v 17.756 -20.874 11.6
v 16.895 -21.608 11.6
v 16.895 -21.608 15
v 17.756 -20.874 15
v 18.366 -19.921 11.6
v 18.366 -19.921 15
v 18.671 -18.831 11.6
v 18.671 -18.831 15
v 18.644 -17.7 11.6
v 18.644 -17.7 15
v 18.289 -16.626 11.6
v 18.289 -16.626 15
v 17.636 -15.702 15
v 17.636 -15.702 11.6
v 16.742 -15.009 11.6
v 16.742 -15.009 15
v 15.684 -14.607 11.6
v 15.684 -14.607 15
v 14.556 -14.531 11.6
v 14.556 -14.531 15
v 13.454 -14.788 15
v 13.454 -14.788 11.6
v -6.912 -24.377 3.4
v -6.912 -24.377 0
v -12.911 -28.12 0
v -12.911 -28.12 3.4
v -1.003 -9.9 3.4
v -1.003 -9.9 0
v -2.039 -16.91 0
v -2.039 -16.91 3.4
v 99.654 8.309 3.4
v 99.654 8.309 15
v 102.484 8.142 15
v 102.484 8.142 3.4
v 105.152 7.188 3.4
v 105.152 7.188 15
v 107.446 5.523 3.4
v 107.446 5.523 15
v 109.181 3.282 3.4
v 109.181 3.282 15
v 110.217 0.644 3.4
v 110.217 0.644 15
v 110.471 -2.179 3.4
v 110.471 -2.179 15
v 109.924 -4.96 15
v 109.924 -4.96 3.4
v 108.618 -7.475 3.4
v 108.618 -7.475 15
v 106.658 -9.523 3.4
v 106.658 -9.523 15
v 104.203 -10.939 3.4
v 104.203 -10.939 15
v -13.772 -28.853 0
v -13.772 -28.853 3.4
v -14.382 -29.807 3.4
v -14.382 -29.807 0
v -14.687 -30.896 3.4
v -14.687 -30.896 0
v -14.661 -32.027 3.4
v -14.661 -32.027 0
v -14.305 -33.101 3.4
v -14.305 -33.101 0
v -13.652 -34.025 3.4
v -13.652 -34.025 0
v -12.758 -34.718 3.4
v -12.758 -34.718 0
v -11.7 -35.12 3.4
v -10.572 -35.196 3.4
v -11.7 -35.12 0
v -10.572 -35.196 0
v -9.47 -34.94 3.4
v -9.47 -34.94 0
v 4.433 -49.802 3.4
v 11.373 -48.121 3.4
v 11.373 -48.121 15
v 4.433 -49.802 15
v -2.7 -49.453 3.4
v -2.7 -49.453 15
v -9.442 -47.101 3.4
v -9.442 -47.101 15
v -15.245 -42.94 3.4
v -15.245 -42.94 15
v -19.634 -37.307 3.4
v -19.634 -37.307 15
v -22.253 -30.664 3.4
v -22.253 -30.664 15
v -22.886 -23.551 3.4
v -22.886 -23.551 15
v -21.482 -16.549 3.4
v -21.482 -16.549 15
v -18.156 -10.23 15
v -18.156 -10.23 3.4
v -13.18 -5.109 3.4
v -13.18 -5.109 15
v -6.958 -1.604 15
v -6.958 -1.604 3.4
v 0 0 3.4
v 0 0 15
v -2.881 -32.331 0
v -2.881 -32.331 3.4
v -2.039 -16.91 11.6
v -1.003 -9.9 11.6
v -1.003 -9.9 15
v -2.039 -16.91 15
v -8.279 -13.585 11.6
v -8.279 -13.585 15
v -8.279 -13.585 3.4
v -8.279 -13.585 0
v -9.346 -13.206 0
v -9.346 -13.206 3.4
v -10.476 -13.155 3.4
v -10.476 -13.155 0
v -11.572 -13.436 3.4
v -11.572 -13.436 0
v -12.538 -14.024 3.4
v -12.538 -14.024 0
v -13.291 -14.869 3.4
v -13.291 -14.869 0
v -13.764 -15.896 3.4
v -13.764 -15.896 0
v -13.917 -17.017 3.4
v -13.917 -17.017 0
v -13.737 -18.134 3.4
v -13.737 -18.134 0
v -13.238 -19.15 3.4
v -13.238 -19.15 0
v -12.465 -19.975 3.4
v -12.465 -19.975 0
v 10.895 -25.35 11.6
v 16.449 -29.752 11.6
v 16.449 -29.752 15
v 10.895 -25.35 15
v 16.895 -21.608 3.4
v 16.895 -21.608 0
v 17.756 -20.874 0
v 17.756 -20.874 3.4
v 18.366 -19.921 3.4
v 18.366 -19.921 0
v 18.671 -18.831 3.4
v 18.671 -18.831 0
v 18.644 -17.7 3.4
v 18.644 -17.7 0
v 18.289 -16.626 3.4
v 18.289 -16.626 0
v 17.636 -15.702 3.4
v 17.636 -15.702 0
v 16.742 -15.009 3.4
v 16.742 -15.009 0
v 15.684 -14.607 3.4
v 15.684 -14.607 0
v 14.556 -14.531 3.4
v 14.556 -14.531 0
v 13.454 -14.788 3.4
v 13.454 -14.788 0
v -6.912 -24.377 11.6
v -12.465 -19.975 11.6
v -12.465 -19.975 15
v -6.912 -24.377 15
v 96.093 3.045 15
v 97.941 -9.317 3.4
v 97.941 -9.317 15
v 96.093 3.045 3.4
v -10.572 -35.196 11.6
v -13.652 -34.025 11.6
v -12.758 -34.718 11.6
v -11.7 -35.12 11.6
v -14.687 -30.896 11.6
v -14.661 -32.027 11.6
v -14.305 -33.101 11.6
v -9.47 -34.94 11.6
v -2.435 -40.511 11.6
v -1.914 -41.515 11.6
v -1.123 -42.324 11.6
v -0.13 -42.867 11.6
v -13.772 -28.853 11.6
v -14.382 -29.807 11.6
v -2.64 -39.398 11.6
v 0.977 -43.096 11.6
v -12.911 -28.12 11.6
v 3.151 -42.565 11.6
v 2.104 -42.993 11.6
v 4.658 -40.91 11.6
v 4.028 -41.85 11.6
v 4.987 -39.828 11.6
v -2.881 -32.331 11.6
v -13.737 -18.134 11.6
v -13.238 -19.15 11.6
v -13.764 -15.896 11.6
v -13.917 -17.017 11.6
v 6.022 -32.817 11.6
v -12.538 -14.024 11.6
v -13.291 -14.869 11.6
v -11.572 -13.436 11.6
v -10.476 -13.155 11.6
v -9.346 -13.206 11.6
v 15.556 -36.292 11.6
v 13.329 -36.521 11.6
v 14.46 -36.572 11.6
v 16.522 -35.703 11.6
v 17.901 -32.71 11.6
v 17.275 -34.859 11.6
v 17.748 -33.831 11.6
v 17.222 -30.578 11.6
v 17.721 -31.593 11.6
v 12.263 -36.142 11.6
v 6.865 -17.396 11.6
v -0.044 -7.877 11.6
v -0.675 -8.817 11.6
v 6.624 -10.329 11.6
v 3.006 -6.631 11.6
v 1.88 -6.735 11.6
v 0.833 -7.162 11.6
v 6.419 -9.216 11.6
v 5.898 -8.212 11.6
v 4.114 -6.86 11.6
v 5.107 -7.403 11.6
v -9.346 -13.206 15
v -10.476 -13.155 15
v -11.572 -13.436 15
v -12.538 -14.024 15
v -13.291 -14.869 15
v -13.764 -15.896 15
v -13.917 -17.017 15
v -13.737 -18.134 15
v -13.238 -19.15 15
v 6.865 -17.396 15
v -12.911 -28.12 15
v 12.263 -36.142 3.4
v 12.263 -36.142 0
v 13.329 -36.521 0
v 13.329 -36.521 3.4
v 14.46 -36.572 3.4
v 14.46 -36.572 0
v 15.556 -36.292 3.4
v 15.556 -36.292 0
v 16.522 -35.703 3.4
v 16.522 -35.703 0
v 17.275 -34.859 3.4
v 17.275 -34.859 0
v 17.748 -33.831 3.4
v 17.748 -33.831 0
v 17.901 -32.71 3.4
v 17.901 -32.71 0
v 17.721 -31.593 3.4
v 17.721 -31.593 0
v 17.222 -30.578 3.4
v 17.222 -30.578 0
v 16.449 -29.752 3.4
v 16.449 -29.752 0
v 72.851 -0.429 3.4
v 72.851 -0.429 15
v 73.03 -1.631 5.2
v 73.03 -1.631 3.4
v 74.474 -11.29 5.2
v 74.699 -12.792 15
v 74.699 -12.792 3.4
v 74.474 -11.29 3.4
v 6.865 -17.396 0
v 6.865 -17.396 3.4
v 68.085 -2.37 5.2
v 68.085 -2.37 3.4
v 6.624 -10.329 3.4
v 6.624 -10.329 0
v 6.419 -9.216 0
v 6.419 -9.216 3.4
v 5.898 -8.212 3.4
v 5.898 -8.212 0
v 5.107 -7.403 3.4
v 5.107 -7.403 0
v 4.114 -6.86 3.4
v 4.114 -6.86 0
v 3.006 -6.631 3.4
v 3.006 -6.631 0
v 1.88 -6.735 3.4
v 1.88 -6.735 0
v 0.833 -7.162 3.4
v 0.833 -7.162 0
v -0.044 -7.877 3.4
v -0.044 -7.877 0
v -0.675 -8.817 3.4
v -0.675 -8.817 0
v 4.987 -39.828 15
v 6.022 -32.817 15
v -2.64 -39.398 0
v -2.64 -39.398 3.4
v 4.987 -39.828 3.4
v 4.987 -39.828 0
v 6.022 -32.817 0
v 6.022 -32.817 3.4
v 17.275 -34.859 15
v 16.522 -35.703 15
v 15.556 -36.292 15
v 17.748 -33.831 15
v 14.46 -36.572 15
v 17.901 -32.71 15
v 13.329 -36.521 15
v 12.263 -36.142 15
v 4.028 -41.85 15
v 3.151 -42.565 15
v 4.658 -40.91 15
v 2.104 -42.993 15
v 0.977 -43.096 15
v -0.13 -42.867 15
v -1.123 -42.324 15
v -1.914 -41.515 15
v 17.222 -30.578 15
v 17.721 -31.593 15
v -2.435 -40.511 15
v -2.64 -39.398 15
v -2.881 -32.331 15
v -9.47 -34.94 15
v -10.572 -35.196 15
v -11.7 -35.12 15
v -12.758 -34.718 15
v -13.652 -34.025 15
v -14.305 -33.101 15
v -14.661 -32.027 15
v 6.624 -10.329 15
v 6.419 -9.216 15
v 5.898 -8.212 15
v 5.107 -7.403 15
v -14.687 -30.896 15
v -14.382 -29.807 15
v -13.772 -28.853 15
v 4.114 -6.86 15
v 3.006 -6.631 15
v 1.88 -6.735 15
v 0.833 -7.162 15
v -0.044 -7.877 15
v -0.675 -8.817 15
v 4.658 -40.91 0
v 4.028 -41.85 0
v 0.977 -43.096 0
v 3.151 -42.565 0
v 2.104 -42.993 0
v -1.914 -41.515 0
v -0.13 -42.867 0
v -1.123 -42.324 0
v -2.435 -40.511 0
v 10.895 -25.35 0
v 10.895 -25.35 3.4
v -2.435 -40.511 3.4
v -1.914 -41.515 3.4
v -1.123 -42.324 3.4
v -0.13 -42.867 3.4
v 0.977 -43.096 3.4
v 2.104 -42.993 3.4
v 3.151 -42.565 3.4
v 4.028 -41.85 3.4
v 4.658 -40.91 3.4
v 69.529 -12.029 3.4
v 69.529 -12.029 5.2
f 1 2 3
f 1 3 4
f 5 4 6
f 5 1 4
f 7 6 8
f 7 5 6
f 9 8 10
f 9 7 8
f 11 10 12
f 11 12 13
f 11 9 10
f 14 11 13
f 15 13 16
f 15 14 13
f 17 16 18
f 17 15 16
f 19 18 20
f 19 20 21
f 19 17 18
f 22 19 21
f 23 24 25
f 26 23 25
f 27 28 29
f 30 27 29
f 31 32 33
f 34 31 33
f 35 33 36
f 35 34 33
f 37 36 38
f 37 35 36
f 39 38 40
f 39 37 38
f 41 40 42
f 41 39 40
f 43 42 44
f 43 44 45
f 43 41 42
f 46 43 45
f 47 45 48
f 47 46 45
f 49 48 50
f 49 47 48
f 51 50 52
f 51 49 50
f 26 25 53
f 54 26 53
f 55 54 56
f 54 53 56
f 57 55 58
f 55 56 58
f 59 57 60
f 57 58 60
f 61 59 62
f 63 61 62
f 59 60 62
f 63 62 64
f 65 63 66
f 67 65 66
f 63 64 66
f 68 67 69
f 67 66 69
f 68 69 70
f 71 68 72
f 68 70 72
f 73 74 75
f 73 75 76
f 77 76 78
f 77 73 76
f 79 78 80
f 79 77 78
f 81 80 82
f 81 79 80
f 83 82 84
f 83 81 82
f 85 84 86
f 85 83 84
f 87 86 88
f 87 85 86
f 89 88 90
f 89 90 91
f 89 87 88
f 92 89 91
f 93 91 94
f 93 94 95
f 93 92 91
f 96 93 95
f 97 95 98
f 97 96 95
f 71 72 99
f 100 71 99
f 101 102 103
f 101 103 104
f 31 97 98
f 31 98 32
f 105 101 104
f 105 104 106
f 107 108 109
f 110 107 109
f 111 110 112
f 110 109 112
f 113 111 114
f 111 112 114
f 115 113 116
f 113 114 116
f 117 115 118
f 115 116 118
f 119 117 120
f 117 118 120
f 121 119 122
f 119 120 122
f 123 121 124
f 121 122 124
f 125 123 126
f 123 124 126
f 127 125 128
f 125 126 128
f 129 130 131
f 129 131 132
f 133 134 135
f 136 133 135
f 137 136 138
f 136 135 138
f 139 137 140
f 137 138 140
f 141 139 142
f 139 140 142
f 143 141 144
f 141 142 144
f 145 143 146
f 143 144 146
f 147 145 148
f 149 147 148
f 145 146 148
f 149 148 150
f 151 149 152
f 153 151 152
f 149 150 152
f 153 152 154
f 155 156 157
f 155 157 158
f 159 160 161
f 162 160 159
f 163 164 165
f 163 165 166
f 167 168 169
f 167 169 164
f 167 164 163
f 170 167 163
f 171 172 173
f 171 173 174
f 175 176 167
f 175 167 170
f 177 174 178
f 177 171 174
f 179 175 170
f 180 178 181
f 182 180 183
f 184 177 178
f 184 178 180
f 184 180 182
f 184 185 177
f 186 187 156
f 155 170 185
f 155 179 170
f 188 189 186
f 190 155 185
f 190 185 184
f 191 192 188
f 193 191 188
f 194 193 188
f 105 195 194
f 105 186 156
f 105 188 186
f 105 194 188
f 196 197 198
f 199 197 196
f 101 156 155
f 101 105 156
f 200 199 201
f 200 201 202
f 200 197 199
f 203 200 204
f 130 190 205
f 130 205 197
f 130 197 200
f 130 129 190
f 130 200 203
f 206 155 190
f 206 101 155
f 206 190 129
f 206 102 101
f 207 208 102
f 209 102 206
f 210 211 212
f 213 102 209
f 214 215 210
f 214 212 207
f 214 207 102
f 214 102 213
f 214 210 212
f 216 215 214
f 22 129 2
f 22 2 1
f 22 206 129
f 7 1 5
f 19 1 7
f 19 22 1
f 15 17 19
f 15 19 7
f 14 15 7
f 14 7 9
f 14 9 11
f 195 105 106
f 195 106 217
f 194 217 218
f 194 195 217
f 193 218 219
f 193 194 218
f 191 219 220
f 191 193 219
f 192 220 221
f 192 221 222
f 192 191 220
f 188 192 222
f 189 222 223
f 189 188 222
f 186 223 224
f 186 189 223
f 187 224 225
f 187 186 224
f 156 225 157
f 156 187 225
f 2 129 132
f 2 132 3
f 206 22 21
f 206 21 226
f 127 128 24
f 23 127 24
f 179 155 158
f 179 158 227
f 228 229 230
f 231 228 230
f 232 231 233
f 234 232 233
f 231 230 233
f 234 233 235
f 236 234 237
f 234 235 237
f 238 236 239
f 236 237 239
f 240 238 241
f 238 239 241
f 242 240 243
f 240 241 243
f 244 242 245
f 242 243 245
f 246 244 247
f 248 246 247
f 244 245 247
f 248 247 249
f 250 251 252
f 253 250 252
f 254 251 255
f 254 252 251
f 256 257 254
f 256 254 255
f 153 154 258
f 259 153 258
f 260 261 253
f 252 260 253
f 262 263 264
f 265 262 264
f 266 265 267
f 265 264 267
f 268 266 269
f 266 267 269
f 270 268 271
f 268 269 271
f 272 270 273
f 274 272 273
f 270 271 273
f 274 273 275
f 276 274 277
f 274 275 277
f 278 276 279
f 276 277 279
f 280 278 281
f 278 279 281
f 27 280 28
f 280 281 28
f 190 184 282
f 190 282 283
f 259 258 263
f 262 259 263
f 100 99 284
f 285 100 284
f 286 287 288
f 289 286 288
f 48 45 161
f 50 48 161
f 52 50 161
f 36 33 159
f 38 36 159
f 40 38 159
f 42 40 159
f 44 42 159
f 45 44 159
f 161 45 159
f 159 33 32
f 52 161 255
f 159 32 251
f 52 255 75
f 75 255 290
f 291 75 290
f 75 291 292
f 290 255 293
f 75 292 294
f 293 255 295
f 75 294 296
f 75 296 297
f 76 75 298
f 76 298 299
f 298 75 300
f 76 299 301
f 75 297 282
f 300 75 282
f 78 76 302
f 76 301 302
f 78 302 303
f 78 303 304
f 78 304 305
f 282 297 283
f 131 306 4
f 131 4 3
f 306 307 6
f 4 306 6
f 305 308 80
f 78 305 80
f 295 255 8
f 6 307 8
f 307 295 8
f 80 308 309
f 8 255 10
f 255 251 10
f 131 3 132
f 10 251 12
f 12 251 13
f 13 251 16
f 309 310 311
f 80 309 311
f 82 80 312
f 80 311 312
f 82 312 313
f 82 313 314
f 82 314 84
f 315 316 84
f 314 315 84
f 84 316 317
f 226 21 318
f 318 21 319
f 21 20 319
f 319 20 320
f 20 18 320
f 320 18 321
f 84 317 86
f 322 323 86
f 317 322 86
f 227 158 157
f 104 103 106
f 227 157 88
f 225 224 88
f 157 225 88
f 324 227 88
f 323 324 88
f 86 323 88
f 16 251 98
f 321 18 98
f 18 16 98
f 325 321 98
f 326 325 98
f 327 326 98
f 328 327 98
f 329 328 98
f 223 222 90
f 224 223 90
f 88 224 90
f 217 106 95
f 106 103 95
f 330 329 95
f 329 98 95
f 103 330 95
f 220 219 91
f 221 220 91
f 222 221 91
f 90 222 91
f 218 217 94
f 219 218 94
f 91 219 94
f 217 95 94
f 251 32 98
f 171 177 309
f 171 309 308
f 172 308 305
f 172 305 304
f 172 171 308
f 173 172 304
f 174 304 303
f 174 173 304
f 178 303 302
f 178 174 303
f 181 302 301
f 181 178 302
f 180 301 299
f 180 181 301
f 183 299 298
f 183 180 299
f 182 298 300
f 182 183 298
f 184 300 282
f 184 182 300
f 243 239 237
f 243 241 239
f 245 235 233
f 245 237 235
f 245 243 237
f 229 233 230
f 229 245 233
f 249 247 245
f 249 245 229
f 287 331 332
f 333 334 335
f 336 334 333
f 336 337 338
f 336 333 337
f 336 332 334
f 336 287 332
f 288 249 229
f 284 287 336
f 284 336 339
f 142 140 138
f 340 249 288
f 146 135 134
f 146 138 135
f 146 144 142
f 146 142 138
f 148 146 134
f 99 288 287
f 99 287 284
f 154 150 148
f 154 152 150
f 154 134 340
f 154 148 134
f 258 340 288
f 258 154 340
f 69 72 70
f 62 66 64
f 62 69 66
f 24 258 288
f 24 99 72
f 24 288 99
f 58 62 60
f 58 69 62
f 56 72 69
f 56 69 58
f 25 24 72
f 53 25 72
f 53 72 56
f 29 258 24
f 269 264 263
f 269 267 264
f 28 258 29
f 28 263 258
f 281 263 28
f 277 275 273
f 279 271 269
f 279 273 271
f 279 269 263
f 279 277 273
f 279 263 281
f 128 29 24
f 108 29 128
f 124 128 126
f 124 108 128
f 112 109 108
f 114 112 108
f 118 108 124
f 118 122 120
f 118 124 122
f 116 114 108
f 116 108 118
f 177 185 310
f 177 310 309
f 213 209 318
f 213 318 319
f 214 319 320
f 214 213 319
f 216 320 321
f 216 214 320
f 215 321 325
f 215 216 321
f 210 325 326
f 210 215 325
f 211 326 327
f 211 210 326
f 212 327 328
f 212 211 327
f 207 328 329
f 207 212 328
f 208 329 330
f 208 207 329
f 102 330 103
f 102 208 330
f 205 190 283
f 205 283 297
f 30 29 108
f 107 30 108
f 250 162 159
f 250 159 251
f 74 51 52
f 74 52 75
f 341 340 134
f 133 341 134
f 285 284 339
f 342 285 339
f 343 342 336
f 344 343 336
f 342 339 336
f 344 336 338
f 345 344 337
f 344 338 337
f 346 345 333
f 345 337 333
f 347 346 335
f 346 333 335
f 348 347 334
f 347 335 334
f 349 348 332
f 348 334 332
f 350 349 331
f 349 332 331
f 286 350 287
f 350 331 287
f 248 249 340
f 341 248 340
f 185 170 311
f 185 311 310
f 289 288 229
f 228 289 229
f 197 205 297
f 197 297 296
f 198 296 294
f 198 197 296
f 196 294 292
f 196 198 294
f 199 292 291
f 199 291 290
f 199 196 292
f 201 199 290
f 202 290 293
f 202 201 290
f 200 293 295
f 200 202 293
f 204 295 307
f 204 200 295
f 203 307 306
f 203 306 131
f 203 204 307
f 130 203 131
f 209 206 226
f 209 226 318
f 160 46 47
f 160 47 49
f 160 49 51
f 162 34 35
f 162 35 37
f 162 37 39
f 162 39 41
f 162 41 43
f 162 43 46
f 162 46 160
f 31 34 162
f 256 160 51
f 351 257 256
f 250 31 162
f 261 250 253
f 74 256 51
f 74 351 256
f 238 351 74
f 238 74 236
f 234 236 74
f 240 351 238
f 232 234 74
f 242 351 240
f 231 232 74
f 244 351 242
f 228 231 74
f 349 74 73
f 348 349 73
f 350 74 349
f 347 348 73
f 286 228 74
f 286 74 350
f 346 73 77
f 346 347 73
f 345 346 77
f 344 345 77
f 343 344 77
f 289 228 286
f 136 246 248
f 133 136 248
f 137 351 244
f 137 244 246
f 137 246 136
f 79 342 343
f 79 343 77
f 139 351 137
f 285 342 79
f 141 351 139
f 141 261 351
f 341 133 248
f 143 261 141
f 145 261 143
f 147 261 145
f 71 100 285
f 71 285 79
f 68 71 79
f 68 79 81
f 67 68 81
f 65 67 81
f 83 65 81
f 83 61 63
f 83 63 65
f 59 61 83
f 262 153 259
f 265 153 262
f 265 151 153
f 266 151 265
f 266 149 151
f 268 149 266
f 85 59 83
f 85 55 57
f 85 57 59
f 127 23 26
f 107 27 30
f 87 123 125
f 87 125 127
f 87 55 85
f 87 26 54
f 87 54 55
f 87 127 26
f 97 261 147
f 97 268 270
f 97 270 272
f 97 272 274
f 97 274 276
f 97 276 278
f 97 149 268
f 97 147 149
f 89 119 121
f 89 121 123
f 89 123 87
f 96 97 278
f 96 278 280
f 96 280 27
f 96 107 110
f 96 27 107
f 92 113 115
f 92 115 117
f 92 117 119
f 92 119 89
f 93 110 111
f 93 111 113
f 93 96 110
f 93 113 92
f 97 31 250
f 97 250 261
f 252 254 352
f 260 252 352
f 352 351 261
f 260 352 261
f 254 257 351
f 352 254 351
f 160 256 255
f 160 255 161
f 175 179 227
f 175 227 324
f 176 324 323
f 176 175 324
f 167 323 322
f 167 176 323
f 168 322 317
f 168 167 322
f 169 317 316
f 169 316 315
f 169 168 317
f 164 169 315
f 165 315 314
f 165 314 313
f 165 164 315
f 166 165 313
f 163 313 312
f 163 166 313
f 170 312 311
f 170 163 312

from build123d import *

# Parameters (mm, degrees)
EXTRUDE_5_DEPTH      = 15
CUT_EXTRUDE_8_DEPTH  = 5.2
CUT_EXTRUDE_9_DEPTH  = 15
CUT_EXTRUDE_10_DEPTH = 3.4
CUT_EXTRUDE_START    = -3.4
CUT_EXTRUDE_11_DEPTH = 3.4


with BuildPart() as part:
    # 草图1 → 凸台-拉伸5 (new body)
    with BuildSketch(Plane.XY):
        with BuildLine():
            Line((0, 0), (99.654203795, 8.309011134))
            ThreePointArc((99.654203795, 8.309011134), (110.217015146, 0.643574044), (104.203277967, -10.939468499))
            Line((104.203277967, -10.939468499), (11.372685429, -48.121199083))
            ThreePointArc((11.372685429, -48.121199083), (-22.25252281, -30.663509172), (0, 0))
        make_face()
    extrude(amount=EXTRUDE_5_DEPTH)

    # 草图9 → 切除-拉伸8 (cut)
    with BuildSketch(Plane(origin=(0, 0, 0), x_dir=(-1, 0, 0), z_dir=(0, 0, -1))):
        Polygon((-68.085389778, -2.37029612), (-73.03044485, -1.631086857), (-74.4743179, -11.290099671), (-69.529262828, -12.029308935), align=None)
    extrude(amount=-CUT_EXTRUDE_8_DEPTH, mode=Mode.SUBTRACT)

    # 草图9<5> → 切除-拉伸9 (cut)
    with BuildSketch(Plane(origin=(0, 0, 0), x_dir=(-1, 0, 0), z_dir=(0, 0, -1))):
        Polygon((-96.092530155, 3.045150664), (-72.850771317, -0.429132874), (-74.698794475, -12.791770554), (-97.940553313, -9.317487016), align=None)
    extrude(amount=-CUT_EXTRUDE_9_DEPTH, mode=Mode.SUBTRACT)

    # 草图1<11> → 切除-拉伸10 (cut)
    with BuildSketch(Plane.XY):
        with BuildLine():
            Line((0, 0), (99.654203795, 8.309011134))
            ThreePointArc((99.654203795, 8.309011134), (110.217015146, 0.643574044), (104.203277967, -10.939468499))
            Line((104.203277967, -10.939468499), (11.372685429, -48.121199083))
            ThreePointArc((11.372685429, -48.121199083), (-22.25252281, -30.663509172), (0, 0))
        make_face()
        with BuildLine():
            Line((6.86492087, -17.396188185), (6.623748603, -10.329097007))
            ThreePointArc((6.623748603, -10.329097007), (3.006492414, -6.630818399), (-1.003160039, -9.899532856))
            Line((-1.003160039, -9.899532856), (-2.038566002, -16.909799595))
            Line((-2.038566002, -16.909799595), (-8.279432627, -13.585115317))
            ThreePointArc((-8.279432627, -13.585115317), (-13.290863946, -14.868611764), (-12.464900415, -19.975429877))
            Line((-12.464900415, -19.975429877), (-6.911534313, -24.377251114))
            Line((-6.911534313, -24.377251114), (-12.91122867, -28.119658014))
            ThreePointArc((-12.91122867, -28.119658014), (-14.305403801, -33.101433069), (-9.469787817, -34.939536725))
            Line((-9.469787817, -34.939536725), (-2.881015752, -32.331091223))
            Line((-2.881015752, -32.331091223), (-2.639843484, -39.398182401))
            ThreePointArc((-2.639843484, -39.398182401), (0.977412704, -43.096461009), (4.987065158, -39.827746552))
            Line((4.987065158, -39.827746552), (6.022471121, -32.817479812))
            Line((6.022471121, -32.817479812), (12.263337746, -36.142164091))
            ThreePointArc((12.263337746, -36.142164091), (17.274769065, -34.858667644), (16.448805534, -29.751849531))
            Line((16.448805534, -29.751849531), (10.895439432, -25.350028294))
            Line((10.895439432, -25.350028294), (16.895133789, -21.607621394))
            ThreePointArc((16.895133789, -21.607621394), (18.28930892, -16.625846339), (13.453692935, -14.787742683))
            Line((13.453692935, -14.787742683), (6.86492087, -17.396188185))
        make_face(mode=Mode.SUBTRACT)
    extrude(amount=CUT_EXTRUDE_10_DEPTH, mode=Mode.SUBTRACT)

    # 草图25 → 切除-拉伸11 (cut)
    with BuildSketch(Plane.XY.offset(15).offset(CUT_EXTRUDE_START)):
        with BuildLine():
            Line((-2.038566002, -16.909799595), (-8.279432627, -13.585115317))
            ThreePointArc((-8.279432627, -13.585115317), (-13.290863946, -14.868611764), (-12.464900415, -19.975429877))
            Line((-12.464900415, -19.975429877), (-6.911534313, -24.377251114))
            Line((-6.911534313, -24.377251114), (-12.91122867, -28.119658014))
            ThreePointArc((-12.91122867, -28.119658014), (-14.305403801, -33.101433069), (-9.469787817, -34.939536725))
            Line((-9.469787817, -34.939536725), (-2.881015752, -32.331091223))
            Line((-2.881015752, -32.331091223), (-2.639843484, -39.398182401))
            ThreePointArc((-2.639843484, -39.398182401), (0.977412704, -43.096461009), (4.987065158, -39.827746552))
            Line((4.987065158, -39.827746552), (6.022471121, -32.817479812))
            Line((6.022471121, -32.817479812), (12.263337746, -36.142164091))
            ThreePointArc((12.263337746, -36.142164091), (17.274769065, -34.858667644), (16.448805534, -29.751849531))
            Line((16.448805534, -29.751849531), (10.895439432, -25.350028294))
            Line((10.895439432, -25.350028294), (16.895133789, -21.607621394))
            ThreePointArc((16.895133789, -21.607621394), (18.28930892, -16.625846339), (13.453692935, -14.787742683))
            Line((13.453692935, -14.787742683), (6.86492087, -17.396188185))
            Line((6.86492087, -17.396188185), (6.623748603, -10.329097007))
            ThreePointArc((6.623748603, -10.329097007), (3.006492414, -6.630818399), (-1.003160039, -9.899532856))
            Line((-1.003160039, -9.899532856), (-2.038566002, -16.909799595))
        make_face()
    extrude(amount=CUT_EXTRUDE_11_DEPTH, mode=Mode.SUBTRACT)


solid = part.part
